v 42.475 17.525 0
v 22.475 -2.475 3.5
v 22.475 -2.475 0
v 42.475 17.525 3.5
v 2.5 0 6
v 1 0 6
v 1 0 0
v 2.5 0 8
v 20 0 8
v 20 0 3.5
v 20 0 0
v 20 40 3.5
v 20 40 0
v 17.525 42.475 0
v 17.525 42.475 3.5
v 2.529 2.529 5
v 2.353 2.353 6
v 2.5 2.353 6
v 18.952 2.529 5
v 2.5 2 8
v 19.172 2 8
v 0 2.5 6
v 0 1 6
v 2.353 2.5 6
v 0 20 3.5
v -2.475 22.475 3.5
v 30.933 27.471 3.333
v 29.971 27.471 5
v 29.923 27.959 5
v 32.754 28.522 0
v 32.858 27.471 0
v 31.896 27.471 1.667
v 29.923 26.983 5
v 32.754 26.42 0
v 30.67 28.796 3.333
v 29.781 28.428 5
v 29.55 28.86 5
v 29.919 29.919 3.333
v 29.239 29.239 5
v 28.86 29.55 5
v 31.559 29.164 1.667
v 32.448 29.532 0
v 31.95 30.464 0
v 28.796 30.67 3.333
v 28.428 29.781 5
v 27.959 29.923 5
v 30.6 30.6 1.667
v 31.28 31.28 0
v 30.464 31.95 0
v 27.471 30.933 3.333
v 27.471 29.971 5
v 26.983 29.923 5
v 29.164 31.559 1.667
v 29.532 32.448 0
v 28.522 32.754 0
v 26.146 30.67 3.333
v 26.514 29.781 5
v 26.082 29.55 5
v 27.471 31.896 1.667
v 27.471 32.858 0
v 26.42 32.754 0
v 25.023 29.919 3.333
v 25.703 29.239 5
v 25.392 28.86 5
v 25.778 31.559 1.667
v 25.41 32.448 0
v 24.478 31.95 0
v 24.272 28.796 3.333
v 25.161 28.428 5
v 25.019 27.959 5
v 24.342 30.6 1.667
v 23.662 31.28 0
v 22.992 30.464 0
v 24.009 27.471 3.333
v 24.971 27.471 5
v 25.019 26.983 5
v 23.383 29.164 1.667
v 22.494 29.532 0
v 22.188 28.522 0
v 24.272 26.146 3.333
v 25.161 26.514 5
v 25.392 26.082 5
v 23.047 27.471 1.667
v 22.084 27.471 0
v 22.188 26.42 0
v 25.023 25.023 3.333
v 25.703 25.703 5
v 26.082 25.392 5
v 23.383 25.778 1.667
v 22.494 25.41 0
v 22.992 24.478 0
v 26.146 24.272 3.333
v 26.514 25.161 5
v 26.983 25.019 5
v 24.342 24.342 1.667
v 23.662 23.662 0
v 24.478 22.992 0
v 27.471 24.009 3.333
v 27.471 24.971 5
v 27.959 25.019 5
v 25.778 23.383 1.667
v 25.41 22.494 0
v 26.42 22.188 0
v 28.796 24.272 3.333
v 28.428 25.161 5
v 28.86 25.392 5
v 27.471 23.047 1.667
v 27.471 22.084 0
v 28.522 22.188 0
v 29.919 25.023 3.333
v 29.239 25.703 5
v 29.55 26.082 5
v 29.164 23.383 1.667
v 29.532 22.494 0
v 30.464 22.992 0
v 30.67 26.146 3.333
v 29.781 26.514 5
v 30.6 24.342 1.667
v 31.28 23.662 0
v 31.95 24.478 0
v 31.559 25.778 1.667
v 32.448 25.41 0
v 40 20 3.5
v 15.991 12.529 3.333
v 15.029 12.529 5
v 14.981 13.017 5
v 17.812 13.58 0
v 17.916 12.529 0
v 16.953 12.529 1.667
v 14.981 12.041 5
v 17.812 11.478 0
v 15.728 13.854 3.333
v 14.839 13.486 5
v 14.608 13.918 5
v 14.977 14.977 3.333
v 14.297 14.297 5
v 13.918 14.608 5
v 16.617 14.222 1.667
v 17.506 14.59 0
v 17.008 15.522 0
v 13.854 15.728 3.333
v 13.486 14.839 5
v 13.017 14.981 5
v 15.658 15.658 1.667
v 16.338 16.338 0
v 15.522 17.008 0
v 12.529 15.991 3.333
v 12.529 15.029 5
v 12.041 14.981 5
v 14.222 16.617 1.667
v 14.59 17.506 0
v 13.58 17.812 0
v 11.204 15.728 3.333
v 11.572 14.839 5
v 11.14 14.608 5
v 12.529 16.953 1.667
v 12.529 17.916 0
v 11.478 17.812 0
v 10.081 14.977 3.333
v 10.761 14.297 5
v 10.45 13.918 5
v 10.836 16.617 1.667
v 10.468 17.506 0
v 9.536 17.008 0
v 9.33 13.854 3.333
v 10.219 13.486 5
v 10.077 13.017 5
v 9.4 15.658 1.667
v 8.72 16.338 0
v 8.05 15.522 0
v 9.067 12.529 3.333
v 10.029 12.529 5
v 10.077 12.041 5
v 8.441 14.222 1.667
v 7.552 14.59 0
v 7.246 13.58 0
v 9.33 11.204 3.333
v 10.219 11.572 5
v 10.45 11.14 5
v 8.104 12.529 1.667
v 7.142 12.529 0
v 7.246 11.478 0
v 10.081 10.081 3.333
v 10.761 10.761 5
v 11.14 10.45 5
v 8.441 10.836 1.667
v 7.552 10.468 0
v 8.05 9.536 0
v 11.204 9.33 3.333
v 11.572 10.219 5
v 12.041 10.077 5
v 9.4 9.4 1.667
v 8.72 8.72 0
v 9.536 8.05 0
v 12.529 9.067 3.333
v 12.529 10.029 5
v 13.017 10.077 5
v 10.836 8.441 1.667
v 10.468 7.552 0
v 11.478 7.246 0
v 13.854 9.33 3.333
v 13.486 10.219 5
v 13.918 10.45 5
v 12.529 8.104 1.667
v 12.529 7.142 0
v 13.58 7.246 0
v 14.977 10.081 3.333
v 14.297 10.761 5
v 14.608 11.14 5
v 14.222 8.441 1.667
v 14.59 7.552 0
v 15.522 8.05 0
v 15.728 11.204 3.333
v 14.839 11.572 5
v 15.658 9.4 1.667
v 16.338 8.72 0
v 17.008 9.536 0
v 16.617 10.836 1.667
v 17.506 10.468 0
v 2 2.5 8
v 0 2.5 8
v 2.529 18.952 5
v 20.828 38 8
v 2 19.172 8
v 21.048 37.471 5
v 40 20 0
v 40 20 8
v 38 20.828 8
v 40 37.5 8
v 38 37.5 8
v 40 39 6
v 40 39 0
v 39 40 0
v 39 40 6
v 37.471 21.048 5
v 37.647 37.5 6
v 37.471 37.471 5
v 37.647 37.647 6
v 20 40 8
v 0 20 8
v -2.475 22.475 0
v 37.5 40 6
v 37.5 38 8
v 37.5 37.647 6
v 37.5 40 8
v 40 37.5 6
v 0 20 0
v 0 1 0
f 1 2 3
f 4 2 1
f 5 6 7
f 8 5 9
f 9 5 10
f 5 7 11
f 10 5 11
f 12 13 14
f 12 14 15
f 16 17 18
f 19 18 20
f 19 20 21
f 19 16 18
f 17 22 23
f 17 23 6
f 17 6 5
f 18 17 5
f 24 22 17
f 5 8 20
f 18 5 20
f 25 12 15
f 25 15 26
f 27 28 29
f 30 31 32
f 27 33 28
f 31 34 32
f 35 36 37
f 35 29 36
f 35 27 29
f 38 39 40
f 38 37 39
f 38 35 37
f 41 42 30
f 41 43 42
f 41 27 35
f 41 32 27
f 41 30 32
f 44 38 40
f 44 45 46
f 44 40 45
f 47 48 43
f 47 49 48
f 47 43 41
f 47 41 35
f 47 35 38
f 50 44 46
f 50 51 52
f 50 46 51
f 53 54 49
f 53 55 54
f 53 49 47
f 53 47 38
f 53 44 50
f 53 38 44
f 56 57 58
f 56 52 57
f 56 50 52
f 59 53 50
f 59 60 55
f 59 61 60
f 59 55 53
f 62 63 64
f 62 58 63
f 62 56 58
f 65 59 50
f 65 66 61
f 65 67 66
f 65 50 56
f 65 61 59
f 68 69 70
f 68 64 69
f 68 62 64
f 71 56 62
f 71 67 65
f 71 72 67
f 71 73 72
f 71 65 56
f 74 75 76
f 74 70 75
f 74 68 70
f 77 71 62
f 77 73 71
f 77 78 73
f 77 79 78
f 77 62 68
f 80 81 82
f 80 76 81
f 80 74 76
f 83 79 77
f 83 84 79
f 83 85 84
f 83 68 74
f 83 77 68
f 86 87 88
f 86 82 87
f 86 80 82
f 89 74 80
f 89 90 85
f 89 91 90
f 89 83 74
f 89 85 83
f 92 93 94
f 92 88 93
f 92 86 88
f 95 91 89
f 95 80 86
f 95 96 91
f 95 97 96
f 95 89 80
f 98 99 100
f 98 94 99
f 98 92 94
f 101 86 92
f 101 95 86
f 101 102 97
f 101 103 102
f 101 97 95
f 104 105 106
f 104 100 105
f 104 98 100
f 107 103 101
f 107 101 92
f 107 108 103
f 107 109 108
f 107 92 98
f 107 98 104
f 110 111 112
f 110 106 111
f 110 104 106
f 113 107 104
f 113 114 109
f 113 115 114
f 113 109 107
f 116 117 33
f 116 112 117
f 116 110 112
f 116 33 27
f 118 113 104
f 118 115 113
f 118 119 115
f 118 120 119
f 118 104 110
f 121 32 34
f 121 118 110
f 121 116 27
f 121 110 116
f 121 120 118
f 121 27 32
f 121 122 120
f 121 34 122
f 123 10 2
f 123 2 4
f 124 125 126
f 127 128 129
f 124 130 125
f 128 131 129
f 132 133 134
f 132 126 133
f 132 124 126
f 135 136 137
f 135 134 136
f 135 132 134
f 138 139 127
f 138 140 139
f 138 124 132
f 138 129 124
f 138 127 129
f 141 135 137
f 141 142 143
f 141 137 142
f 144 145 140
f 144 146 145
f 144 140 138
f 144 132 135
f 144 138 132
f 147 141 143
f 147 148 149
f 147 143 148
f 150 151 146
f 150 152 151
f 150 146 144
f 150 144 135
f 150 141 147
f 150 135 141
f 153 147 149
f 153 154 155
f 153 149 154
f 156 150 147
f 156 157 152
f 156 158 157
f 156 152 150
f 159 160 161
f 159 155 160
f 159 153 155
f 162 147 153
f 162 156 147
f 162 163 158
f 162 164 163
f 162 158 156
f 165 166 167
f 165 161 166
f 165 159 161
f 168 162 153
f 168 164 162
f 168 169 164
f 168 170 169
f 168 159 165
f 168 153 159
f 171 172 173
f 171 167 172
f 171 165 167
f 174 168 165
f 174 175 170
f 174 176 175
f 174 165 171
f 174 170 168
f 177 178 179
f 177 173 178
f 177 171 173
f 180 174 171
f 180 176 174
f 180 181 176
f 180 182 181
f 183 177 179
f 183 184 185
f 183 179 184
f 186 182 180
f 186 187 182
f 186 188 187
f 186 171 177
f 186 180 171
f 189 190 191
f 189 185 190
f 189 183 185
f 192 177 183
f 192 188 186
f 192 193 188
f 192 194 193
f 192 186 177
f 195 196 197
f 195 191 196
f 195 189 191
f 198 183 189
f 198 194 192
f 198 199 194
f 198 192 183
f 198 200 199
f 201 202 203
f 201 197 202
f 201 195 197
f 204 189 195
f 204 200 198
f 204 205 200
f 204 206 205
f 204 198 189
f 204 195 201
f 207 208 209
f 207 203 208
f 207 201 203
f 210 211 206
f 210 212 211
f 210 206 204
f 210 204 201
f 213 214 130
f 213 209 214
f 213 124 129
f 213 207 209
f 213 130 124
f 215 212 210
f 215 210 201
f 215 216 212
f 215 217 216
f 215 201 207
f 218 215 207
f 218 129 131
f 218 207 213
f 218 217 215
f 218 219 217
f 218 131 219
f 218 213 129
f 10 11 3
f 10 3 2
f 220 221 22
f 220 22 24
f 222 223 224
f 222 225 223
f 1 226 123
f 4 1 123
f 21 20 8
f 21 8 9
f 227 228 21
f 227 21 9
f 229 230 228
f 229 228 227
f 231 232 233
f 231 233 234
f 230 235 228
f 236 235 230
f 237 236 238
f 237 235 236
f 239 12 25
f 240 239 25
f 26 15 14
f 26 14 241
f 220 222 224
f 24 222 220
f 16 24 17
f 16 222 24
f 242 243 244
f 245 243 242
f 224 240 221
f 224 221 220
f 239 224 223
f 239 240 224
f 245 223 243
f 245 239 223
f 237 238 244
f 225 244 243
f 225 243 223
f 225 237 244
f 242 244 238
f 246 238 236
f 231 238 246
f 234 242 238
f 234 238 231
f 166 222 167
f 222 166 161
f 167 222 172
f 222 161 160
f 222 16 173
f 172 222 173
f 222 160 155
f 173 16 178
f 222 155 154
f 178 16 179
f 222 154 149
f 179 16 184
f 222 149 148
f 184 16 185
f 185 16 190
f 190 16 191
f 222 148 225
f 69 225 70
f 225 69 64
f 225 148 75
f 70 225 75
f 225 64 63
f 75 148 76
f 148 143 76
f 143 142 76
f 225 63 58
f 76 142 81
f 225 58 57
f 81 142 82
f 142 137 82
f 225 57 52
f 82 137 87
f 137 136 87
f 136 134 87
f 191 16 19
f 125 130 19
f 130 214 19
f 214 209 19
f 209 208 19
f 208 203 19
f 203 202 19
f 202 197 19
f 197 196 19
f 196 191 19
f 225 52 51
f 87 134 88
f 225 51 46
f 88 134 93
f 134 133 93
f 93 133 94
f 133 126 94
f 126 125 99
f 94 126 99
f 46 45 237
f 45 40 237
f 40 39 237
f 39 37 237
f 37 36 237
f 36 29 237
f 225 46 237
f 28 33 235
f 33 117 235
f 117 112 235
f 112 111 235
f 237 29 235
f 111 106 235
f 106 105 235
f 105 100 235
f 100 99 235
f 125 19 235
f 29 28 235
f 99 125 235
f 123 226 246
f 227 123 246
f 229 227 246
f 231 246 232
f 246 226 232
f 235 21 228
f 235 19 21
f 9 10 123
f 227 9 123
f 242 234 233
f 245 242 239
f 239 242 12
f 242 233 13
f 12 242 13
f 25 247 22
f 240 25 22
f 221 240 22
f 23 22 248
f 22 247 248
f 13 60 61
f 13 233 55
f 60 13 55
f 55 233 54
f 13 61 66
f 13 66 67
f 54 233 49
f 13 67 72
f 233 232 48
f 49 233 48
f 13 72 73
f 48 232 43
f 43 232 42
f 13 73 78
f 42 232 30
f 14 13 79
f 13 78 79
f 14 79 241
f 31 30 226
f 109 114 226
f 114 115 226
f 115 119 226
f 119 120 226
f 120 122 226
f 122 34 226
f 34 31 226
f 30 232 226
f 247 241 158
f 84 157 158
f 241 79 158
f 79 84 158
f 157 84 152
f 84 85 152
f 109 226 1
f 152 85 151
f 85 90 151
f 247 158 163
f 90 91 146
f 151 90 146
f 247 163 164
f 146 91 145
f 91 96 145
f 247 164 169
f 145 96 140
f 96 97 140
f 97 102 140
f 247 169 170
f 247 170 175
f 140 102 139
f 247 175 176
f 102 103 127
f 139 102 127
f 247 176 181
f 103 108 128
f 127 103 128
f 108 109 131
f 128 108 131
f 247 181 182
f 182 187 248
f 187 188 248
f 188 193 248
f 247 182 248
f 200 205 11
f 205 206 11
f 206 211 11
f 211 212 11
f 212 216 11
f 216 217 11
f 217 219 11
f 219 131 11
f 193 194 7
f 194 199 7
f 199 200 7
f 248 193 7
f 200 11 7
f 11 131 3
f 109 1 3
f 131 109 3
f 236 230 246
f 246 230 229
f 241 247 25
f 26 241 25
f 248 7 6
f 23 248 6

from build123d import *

# Parameters (mm, degrees)
F1_DEPTH  = 8
F3_DEPTH  = 3
F3_TAPER  = 10
F4_SIZE   = 1
F5_W      = 2.5
F5_H      = 2.5
F6_DEPTH  = 2
F7_R      = 2.5
F8_DEPTH  = 5
F8_TAPER  = -30
F9_W      = 28.2842712475
F9_H      = 3.5
F10_DEPTH = 3.5
F11_W     = 28.2842712475
F11_H     = 3.5
F12_DEPTH = 3.5


with BuildPart() as f1:
    # F0 (on Top) → F1 (new body)
    with BuildSketch(Plane.XY):
        Polygon((0, 20), (0, 0), (20, 0), (40, 20), (40, 40), (20, 40), align=None)
    extrude(amount=F1_DEPTH)

    # F2 (on face) → F3 (cut)
    with BuildSketch(Plane.XY.offset(8)):
        Polygon((2, 19.1715728753), (2, 2), (19.1715728753, 2), (38, 20.8284271247), (38, 38), (20.8284271247, 38), align=None)
    extrude(amount=-F3_DEPTH, taper=F3_TAPER, mode=Mode.SUBTRACT)

    # F4
    f4_edges = [f1.edges().sort_by_distance(p)[0] for p in [
        (0, 0, 4),
        (40, 40, 4),
    ]]
    chamfer(f4_edges, length=F4_SIZE)

    # F5 (on face) → F6 (cut)
    with BuildSketch(Plane.XY.offset(8)):
        with Locations((1.25, 1.25)):
            Rectangle(F5_W, F5_H)
        with Locations((38.75, 38.75)):
            Rectangle(F5_W, F5_H)
    extrude(amount=-F6_DEPTH, mode=Mode.SUBTRACT)

    # F7 (on face) → F8 (cut, through all)
    with BuildSketch(Plane.XY.offset(5)):
        with Locations((12.5289809421, 12.5289809421)):
            Circle(F7_R)
        with Locations((27.4710190579, 27.4710190579)):
            Circle(F7_R)
    extrude(amount=-F8_DEPTH, taper=F8_TAPER, mode=Mode.SUBTRACT)

    # F9 (on face) → F10 (join)
    with BuildSketch(Plane(origin=(10, -10, 0), x_dir=(0.7071067812, 0.7071067812, 0), z_dir=(0.7071067812, -0.7071067812, 0))):
        with Locations((28.2842712475, 1.75)):
            Rectangle(F9_W, F9_H)
    extrude(amount=F10_DEPTH)

    # F11 (on face) → F12 (join)
    with BuildSketch(Plane(origin=(-10, 10, 0), x_dir=(-0.7071067812, -0.7071067812, 0), z_dir=(-0.7071067812, 0.7071067812, 0))):
        with Locations((-28.2842712475, 1.75)):
            Rectangle(F11_W, F11_H)
    extrude(amount=F12_DEPTH)


solid = f1.part
